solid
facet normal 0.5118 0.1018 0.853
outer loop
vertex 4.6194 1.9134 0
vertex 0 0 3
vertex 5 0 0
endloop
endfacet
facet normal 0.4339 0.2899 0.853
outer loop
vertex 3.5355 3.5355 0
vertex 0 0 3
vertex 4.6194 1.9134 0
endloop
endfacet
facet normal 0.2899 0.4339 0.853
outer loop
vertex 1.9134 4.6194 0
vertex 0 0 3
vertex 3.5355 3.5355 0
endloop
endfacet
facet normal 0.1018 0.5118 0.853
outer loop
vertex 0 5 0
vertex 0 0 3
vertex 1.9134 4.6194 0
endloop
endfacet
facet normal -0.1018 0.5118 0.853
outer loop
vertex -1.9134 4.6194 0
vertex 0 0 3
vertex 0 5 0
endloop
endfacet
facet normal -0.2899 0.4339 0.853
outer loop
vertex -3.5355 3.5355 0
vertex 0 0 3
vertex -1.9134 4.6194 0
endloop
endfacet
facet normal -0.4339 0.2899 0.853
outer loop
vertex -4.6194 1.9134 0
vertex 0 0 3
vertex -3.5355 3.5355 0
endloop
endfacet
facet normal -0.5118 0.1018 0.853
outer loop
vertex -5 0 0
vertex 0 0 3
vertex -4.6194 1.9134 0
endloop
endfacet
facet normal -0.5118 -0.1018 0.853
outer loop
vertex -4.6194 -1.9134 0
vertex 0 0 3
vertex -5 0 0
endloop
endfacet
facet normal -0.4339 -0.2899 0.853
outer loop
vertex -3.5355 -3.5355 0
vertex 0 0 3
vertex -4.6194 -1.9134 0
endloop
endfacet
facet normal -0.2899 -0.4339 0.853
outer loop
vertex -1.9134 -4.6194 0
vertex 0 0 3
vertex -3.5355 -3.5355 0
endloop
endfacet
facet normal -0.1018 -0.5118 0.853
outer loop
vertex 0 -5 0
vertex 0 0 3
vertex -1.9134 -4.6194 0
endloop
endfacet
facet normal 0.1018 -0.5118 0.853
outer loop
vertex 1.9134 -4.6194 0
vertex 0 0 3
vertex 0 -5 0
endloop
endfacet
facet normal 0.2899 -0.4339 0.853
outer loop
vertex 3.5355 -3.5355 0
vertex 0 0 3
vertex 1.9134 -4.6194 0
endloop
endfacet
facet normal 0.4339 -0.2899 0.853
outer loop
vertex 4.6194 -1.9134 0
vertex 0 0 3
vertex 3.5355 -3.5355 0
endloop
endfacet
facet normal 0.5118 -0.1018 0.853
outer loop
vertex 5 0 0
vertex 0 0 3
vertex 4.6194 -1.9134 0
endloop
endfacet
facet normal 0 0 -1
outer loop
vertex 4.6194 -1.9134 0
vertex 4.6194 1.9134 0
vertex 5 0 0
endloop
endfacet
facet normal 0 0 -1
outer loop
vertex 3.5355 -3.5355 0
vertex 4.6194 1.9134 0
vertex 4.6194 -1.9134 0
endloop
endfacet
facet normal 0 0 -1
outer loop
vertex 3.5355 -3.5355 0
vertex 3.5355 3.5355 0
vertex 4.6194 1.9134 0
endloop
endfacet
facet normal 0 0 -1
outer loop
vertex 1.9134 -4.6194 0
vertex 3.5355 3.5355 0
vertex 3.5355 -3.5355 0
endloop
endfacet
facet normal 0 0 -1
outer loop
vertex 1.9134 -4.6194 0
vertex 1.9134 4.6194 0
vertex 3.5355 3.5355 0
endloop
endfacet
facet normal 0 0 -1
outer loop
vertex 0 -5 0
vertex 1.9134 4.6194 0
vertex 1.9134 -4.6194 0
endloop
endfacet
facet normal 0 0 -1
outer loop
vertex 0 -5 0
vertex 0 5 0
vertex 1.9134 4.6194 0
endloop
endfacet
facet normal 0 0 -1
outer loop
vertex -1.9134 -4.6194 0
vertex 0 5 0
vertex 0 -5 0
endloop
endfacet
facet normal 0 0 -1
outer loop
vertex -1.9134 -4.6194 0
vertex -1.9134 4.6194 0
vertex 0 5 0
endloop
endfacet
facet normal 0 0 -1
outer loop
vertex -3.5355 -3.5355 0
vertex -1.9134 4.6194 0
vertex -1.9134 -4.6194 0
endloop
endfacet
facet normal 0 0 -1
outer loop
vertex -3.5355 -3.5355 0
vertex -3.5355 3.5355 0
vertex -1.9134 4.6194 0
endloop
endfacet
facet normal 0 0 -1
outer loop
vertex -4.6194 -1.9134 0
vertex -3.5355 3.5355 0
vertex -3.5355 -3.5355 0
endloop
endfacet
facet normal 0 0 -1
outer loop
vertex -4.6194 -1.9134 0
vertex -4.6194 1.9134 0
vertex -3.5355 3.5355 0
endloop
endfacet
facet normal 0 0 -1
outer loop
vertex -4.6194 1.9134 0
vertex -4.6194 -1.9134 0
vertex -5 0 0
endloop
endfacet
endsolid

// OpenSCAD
// Generated by SolidPython 1.0.1 on 2020-07-29 00:39:25


cylinder(h = 3, r1 = 5, r2 = 0);
/***********************************************
*********      SolidPython code:      **********
************************************************
 
# import packages: SolidPython
from solid import *
from solid.utils import *
from itertools import chain, combinations


class Resize:

    def __init__(self, scad_file):
        self.scad_file = scad_file
        #self.scad_file = import_scad(scad_file)
        # cone/cylinder param:
        self.r1 = 0
        self.r2 = 0
        self.h = 0
        # rectangular prism param:
        self.w = 0
        self.l = 0
        # ellipse param:
        self.r = 0

    # import OpenScad code (file name corresponds to shape)


    # classify shape + parameters
    def assign(self, param1, param2, param3):
        if self.scad_file == 'cone.scad':
            self.r1 = param1
            self.r2 = param2
            self.h = param3
        elif self.scad_file == 'cylinder.scad':
            self.r1 = param1
            self.r2 = param2
            self.h = param3
        elif self.scad_file == 'rectangularPrism.scad':
            self.h = param1
            self.l = param2
            self.w = param3
        else:
            self.r = param1
            self.h = param2

    # resize parameters
    def iterate(self):
        x = range(3, 20, 2)
        i = 1
        if self.scad_file == 'cone.scad':
            tempList = list(combinations(x, 2))
            for temp in tempList:
                param1 = temp[0]
                param2 = temp[1]
                filepath = 'produced_scad_files/' + 'cone' + str(param1) + '_' + str(param2) + '_' + '.scad'
                scad_render_to_file(cylinder(h=param1, r1=param2, r2=0), filepath)

        elif self.scad_file == 'cylinder.scad':
            tempList = list(combinations(x, 3))
            for temp in tempList:
                param1 = temp[0]
                param2 = temp[1]
                filepath = 'produced_scad_files/' + 'cylinder' + str(param1) + '_' + str(param2) + '_' + '.scad'
                scad_render_to_file(cylinder(h=param1, r1=param2, r2=param2), filepath)

        elif self.scad_file == 'rectangularPrism.scad':
            tempList = list(combinations(x, 3))
            for temp in tempList:
                param1 = temp[0]
                param2 = temp[1]
                param3 = temp[2]
                filepath = 'produced_scad_files/' + 'rectangularPrism' + str(param1) + '_' + str(param2) + '_' + str(
                    param3) + '.scad'
                scad_render_to_file(cube(size=(param1, param2, param3)), filepath)

        elif self.scad_file == 'ellipse.scad':
            tempList = list(combinations(x, 4))
            for temp in tempList:
                param1 = temp[0]
                param2 = temp[1]
                param3 = temp[2]
                param4 = temp[3]
                filepath = 'produced_scad_files/' + 'ellipse' + str(param1) + '_' + str(param2) + '_' + str(param3) + '_' + str(param4) + '.scad'
                scad_render_to_file(scale([param1, param2, param3])(sphere(r=param4)), filepath)

    def render_to_scadfile(self):
        scad_render_to_file(scad, 'example.scad') 
 
************************************************/
